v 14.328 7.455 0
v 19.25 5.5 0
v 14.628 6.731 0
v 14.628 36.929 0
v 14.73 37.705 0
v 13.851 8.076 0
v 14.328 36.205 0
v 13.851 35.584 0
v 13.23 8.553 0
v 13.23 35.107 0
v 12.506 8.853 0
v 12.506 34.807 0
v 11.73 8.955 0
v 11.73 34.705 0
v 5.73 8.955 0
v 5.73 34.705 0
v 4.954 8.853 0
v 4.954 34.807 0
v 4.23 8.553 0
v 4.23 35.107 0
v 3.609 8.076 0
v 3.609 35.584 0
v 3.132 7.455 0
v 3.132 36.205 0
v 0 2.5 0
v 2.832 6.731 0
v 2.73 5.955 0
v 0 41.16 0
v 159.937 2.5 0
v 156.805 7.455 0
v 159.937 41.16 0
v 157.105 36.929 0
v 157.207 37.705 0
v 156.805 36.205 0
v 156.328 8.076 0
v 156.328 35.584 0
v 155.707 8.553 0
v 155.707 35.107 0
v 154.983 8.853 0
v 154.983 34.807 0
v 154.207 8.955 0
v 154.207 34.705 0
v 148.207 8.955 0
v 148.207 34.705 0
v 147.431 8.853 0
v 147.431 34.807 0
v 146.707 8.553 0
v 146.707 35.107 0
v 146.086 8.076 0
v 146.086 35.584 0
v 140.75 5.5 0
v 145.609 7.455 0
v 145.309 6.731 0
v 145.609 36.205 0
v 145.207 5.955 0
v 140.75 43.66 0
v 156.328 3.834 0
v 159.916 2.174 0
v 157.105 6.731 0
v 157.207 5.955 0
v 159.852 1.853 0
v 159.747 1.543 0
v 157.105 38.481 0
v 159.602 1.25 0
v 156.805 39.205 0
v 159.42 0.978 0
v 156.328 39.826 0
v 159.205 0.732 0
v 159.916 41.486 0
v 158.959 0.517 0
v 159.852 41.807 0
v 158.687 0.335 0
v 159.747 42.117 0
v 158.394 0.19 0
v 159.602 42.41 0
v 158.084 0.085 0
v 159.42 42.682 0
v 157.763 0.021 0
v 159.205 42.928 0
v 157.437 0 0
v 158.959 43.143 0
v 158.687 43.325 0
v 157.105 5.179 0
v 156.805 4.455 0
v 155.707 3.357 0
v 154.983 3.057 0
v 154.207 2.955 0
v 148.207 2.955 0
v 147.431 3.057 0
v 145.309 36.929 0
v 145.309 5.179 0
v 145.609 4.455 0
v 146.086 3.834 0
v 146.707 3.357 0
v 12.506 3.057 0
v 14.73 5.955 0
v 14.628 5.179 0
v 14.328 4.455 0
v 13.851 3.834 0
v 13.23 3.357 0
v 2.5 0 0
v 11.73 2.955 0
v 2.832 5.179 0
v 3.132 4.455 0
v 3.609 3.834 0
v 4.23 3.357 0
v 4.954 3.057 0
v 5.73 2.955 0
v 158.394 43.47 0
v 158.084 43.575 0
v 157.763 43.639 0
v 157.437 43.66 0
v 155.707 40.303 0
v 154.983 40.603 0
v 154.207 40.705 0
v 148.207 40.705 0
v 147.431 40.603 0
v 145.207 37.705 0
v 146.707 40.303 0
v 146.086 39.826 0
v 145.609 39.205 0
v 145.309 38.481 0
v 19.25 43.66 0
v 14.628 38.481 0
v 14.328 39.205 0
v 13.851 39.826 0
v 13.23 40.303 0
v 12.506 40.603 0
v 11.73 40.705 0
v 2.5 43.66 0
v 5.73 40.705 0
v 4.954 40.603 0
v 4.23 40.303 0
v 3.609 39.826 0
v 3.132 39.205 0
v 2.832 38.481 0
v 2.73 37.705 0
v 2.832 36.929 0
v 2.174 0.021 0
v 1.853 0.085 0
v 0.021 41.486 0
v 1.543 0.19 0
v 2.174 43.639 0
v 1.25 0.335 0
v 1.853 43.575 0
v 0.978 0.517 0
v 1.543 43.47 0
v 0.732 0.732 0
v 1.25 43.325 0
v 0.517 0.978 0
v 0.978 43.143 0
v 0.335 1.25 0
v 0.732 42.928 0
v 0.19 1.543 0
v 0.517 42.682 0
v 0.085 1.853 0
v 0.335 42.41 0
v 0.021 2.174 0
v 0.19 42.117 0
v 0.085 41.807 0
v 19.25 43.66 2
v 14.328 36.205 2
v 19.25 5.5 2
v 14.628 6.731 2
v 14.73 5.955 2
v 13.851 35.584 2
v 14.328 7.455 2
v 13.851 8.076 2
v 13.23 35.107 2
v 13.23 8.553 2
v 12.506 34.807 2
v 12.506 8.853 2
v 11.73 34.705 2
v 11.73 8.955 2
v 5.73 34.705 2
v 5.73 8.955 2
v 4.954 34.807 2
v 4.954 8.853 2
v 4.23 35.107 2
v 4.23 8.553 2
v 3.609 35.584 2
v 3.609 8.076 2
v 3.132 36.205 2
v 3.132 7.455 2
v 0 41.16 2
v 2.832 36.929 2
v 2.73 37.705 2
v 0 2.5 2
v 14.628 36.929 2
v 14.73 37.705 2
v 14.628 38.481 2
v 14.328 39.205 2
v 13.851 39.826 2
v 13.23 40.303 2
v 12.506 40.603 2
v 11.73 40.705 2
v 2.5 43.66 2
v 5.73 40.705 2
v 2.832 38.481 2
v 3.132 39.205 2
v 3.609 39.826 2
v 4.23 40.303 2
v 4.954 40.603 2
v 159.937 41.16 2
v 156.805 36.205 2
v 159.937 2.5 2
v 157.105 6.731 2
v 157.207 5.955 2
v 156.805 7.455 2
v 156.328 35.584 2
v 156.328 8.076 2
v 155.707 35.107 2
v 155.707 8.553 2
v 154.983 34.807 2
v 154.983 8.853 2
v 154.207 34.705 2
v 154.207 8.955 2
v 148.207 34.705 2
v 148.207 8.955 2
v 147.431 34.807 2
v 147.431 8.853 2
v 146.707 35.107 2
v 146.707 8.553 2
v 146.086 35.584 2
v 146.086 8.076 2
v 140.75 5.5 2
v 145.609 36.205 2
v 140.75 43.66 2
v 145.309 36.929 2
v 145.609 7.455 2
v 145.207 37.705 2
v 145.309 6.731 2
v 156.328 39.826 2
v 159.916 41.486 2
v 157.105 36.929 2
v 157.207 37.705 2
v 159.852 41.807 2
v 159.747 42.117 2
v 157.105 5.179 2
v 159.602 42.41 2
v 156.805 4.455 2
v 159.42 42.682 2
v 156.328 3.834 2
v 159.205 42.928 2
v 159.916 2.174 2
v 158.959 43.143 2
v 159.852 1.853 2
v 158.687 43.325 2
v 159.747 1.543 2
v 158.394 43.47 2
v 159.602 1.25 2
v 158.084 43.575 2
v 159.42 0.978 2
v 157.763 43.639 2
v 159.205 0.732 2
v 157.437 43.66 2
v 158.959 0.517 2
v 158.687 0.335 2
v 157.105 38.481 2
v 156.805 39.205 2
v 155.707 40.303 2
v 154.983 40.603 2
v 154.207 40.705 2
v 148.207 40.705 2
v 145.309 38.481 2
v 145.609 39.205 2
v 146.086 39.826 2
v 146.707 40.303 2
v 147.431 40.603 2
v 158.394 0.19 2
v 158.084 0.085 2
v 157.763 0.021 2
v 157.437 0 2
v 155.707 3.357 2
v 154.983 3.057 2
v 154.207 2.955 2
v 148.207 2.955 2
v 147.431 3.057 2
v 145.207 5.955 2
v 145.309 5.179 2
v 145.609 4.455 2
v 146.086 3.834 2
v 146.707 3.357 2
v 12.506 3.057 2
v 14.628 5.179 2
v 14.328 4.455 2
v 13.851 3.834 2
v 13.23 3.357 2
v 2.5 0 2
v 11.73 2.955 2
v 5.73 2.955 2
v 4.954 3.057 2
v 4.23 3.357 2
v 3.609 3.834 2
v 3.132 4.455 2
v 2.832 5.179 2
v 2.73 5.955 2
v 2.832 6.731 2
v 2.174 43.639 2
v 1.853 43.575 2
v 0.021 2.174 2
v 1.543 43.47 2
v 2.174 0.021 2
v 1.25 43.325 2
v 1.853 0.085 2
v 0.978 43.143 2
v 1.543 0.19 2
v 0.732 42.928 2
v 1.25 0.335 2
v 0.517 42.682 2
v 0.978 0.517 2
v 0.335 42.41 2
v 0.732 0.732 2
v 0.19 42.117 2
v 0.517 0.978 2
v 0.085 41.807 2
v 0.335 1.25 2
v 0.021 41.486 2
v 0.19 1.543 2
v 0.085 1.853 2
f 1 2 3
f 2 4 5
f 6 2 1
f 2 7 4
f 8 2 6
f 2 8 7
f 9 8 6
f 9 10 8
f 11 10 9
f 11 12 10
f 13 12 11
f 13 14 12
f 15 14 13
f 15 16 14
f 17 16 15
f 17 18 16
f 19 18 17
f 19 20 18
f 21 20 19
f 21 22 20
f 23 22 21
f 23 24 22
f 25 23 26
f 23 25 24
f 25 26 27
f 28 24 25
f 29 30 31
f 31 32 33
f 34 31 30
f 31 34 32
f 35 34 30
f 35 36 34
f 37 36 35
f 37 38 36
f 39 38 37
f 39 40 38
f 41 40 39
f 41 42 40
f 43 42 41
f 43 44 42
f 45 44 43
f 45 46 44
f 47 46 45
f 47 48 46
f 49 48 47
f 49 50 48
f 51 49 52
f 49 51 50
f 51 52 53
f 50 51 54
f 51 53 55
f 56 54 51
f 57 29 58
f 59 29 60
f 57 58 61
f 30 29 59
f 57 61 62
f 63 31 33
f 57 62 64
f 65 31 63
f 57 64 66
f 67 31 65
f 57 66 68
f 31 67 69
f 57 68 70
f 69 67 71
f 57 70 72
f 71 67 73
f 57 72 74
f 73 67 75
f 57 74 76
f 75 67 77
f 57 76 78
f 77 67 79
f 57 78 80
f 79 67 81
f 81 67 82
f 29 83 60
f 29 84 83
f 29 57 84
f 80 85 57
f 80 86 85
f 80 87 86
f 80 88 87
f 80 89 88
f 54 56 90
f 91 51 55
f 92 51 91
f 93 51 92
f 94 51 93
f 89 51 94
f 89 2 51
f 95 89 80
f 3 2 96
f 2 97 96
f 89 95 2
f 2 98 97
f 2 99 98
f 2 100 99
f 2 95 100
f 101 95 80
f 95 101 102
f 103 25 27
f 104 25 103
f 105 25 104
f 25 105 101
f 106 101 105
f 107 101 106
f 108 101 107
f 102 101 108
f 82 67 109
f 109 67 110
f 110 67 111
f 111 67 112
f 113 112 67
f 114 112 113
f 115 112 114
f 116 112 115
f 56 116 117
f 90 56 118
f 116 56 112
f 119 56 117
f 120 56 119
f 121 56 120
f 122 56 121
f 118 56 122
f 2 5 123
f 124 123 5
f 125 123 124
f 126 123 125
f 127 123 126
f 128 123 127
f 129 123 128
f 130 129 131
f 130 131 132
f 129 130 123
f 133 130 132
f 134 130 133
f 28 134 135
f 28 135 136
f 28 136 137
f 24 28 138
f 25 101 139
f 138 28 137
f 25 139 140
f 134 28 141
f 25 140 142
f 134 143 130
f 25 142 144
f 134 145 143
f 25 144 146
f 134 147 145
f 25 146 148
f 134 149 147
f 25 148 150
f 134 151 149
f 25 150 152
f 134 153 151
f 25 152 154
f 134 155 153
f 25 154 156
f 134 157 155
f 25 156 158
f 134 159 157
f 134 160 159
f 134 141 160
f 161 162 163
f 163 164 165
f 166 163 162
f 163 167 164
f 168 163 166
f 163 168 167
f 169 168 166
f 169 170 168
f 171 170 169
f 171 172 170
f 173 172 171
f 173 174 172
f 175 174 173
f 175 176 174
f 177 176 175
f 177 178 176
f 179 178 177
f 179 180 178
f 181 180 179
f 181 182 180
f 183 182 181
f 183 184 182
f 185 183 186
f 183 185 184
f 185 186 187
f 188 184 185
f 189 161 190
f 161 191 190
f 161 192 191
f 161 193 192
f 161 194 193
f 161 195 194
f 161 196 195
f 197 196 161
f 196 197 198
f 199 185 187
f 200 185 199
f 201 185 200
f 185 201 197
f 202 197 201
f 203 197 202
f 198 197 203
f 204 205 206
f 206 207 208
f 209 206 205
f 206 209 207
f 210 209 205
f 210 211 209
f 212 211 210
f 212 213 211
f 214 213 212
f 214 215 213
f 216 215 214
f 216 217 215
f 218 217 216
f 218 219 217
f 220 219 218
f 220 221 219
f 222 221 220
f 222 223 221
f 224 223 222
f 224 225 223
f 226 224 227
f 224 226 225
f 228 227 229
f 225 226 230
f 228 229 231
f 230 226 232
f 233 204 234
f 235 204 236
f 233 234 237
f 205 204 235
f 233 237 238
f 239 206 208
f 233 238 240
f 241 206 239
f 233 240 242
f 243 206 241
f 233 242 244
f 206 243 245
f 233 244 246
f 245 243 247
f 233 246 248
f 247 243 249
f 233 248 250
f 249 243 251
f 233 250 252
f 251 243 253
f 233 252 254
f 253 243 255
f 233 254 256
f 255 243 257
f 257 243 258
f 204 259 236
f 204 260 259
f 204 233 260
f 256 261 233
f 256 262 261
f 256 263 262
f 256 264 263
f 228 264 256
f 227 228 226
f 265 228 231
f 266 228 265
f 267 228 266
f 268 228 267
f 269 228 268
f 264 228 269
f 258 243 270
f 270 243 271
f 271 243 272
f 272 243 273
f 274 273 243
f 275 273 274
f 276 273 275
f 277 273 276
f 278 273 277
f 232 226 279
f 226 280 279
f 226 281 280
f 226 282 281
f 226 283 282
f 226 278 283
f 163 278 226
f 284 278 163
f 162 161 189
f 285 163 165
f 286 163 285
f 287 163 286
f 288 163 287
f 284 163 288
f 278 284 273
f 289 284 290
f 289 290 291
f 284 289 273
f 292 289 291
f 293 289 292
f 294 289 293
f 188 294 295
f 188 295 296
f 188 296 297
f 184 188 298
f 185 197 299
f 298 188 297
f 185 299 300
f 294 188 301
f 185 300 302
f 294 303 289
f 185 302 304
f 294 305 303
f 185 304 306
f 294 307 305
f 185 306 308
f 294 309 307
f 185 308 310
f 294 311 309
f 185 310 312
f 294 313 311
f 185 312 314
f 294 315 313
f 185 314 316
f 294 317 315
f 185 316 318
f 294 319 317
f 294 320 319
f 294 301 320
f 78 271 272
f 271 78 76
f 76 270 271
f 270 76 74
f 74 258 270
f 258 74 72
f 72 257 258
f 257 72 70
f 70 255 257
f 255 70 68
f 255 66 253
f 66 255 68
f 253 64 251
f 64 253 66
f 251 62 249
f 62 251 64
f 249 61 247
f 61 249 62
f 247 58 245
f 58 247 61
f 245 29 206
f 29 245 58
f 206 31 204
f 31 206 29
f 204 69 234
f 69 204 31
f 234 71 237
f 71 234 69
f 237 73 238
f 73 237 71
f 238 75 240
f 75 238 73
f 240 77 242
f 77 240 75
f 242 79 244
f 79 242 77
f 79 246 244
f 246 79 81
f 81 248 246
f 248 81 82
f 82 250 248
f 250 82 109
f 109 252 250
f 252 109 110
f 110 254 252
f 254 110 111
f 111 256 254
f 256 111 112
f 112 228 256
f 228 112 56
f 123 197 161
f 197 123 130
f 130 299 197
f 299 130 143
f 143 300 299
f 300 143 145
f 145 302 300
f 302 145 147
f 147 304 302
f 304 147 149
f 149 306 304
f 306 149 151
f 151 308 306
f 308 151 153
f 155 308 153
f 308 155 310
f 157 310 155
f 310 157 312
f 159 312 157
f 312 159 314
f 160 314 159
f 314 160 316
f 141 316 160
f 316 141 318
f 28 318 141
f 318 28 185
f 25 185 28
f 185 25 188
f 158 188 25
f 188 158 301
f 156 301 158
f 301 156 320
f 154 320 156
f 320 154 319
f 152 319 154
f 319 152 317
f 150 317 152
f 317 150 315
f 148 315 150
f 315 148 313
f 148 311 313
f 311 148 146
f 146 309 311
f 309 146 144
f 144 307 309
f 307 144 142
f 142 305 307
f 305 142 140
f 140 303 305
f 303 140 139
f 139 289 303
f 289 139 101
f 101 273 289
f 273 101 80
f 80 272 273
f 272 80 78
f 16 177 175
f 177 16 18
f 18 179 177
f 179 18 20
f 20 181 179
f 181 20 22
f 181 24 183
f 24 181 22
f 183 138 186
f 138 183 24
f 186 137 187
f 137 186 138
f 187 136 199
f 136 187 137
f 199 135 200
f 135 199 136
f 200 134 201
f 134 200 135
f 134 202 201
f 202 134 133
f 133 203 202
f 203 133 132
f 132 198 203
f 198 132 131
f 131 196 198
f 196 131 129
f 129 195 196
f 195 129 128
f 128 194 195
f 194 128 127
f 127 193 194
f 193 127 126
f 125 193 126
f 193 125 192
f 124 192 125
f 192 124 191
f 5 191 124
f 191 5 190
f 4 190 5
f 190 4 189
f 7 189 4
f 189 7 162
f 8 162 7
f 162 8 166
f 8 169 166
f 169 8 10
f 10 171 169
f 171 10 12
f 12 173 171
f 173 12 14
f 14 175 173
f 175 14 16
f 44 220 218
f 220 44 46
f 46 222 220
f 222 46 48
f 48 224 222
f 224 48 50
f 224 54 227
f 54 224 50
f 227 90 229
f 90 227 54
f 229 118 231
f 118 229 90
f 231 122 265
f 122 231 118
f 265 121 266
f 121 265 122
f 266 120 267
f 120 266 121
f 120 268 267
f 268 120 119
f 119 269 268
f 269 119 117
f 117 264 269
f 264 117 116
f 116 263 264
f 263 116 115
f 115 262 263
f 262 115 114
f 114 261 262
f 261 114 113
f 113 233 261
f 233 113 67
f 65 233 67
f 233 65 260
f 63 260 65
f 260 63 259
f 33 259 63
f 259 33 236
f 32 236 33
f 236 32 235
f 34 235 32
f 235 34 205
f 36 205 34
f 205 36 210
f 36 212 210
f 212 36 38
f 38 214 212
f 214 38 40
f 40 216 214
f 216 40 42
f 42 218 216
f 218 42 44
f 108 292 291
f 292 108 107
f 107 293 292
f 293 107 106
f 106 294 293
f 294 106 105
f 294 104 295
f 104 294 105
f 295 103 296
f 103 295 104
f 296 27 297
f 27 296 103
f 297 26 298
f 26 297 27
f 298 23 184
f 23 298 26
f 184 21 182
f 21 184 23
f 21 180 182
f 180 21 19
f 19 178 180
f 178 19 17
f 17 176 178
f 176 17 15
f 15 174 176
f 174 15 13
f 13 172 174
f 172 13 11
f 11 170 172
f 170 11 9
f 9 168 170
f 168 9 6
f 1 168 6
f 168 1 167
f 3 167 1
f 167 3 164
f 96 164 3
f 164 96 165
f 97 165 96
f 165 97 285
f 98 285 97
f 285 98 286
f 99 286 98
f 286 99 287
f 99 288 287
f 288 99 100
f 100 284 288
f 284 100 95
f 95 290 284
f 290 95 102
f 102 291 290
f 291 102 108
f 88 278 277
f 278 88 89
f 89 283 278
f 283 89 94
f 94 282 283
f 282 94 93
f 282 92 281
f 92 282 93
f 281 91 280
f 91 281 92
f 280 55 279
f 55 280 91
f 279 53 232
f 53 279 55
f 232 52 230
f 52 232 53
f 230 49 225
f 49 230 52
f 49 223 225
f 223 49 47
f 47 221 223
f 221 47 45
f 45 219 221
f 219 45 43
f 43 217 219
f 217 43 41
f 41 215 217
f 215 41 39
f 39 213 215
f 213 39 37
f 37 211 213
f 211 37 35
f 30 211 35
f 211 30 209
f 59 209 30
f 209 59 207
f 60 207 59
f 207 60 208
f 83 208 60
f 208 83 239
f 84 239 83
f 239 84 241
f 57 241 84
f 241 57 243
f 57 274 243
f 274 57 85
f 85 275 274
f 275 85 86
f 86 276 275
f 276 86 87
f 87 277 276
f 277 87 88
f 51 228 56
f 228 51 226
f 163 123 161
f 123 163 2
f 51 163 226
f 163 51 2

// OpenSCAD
// file: rack_plate.scad
/**
 * OpenSCAD Rack Plate Library
 * 
 * Conforms to standards defined in Wikipedia for Rack Units (19-inch racks).
 * Formula for height: h = 44.45 * n - 0.79 (mm)
 * Standard mounting width: 465.14 mm (center-to-center)
 */

// --- Default Values ---
DEFAULT_U_COUNT = 1;
DEFAULT_THICKNESS = 3;
DEFAULT_WIDTH_INCHES = 6.5;
DEFAULT_CORNER_RADIUS = 2.5;
DEFAULT_HOLE_DIAMETER = 6;
DEFAULT_SLOT_LENGTH = 12; // At least twice the diameter (6mm * 2)

// --- Modules ---

/**
 * Generates a rack plate.
 * 
 * @param u_count Number of rack units (n)
 * @param thickness Plate thickness in mm
 * @param width_inches Nominal width of the rack in inches (default 19)
 * @param corner_radius Radius for the outer corners in mm
 * @param hole_diameter Diameter of the mounting holes in mm
 * @param slot_length Total length of the oblong mounting holes in mm
 */
module rack_plate(
    u_count         = DEFAULT_U_COUNT,
    thickness       = DEFAULT_THICKNESS,
    width_inches    = DEFAULT_WIDTH_INCHES,
    corner_radius   = DEFAULT_CORNER_RADIUS,
    hole_diameter   = DEFAULT_HOLE_DIAMETER,
    slot_length     = DEFAULT_SLOT_LENGTH
) {
    // Requirements validation
    assert(width_inches >= 5.5 && width_inches <= 23, "Width must be between 5.5 and 23 inches");

    // Constants based on requirements
    u_height_mm = 44.45;
    height_offset_mm = 0.79;
    
    // Formula: h = 44.45 * n - 0.79
    total_height = (u_height_mm * u_count) - height_offset_mm;
    
    // 19-inch rack mounting width (center to center)
    // Wikipedia: 18.313 in = 465.14 mm
    standard_mounting_width = 465.14; 
    standard_total_width = 19 * 25.4; // 482.6 mm
    
    // Total width of the plate. 
    total_width = width_inches * 25.4;
    
    // Flange width calculation (distance from edge to mounting hole center)
    // "It is critical that the mounting holes retain their position relative to the adjacent ends of the panel"
    // For a standard 19" rack, the offset from edge to hole center is:
    edge_to_hole_offset = (standard_total_width - standard_mounting_width) / 2;

    linear_extrude(height = thickness) 
    {
        difference() 
        {
            // Main Plate Body with rounded corners
            rounded_rect(total_width, total_height, corner_radius);

            // Mounting Holes
            // "The code should generate flanges with 2 rather than three holes per 1 U of height."
            if (u_count >= 1.0) 
            {
                for (u = [0 : floor(u_count) - 1]) 
                {
                    u_base_y = u * u_height_mm;
                    hole_spacing = 31.75; 
                    y_offset = (u_height_mm - hole_spacing) / 2;
                    
                    y_pos1 = u_base_y + y_offset;
                    y_pos2 = u_base_y + y_offset + hole_spacing;
    
                    // Center holes in the total_height
                    // Since total_height = u_count * 44.45 - 0.79, 
                    // the gaps are at the top and bottom of the stack.
                    // We shift everything by (0.79 / 2) to center it if we consider 
                    // the 0.79 to be distributed.
                    // Actually, the previous code had a formula for center_shift.
                    total_nominal_height = u_height_mm * u_count;
                    center_shift = (total_nominal_height - total_height) / 2;
                    
                    p1 = y_pos1 - center_shift;
                    p2 = y_pos2 - center_shift;
    
                    // Left Holes (Oblong)
                    translate([edge_to_hole_offset, p1])
                    {
                        oblong_hole(hole_diameter, slot_length);
                    }
                    translate([edge_to_hole_offset, p2]) 
                    {
                        oblong_hole(hole_diameter, slot_length);
                    }   
                    // Right Holes (Oblong)
                    translate([total_width - edge_to_hole_offset, p1]) 
                    {
                        oblong_hole(hole_diameter, slot_length);
                    }
                    translate([total_width - edge_to_hole_offset, p2]) 
                    {
                        oblong_hole(hole_diameter, slot_length);
                    }
                }
            }
            else if(u_count < 1.0)
            {
                // There can only be one mounting hole on each side, if any.
                u = 0;
                u_base_y = u * u_height_mm/2;
                hole_spacing = 31.75; 
                y_offset = (u_height_mm - hole_spacing) / 2;
                
                y_pos1 = u_base_y + u_height_mm/4;

                // Center holes in the total_height
                // Since total_height = u_count * 44.45 - 0.79, 
                // the gaps are at the top and bottom of the stack.
                // We shift everything by (0.79 / 2) to center it if we consider 
                // the 0.79 to be distributed.
                // Actually, the previous code had a formula for center_shift.
                total_nominal_height = u_height_mm * u_count;
                center_shift = (total_nominal_height - total_height) / 2;
                
                p1 = y_pos1 - center_shift;

                // Left Holes (Oblong vertical)
                translate([edge_to_hole_offset,  p1])
                {
                    rotate([0, 0, 90])
                    {
                        oblong_hole(hole_diameter, slot_length);
                    }
                }
                    
                // Right Holes (Oblong vertical)
                translate([total_width - edge_to_hole_offset, p1])
                {
                    rotate([0, 0, 90])
                    {
                        oblong_hole(hole_diameter, slot_length);
                    }
                }
            }
        }
    }
}

/**
 * Helper for oblong (slotted) hole
 */
module oblong_hole(d, l) 
{
    hull() 
    {
        translate([-(l - d) / 2, 0]) circle(d = d, $fn = 24);
        translate([(l - d) / 2, 0]) circle(d = d, $fn = 24);
    }
}

/**
 * Helper for rounded rectangle 2D shape
 */
module rounded_rect(w, h, r) 
{
    translate([r, r, 0])
    {
        minkowski() 
        {
            square([w - 2 * r, h - 2 * r]);
            circle(r = r, $fn = 48);
        }
    } 
}

// --- Example Usage ---
// This will render when the file is opened directly in OpenSCAD
// but won't interfere when included in other files.

rack_plate(u_count = 0.75, width_inches= 6.5);
// main file
// Simple rack panel for Pi Display 2 (small)
//
// (c) 2026 David M. Witten II
//===================================================================
// Constant Parameters
use <rack_plate.scad>
in2mm               = 25.41;  // mm / in

plate_length        = 16.0;   // mm
plate_width         = 160.0;  // mm
plate_thickness     = 2.0;    // mm

mnt_hole_width      = 7.5;    // mm
mnt_hole_len        = 11.0;   // mm

//===================================================================
// Modifiable Parameters


//===================================================================
// Main()
module cutout()
{
    display_cutout = cube([120, 75, 16]);
}

//===================================================================
// main()
module main()
{
    difference()
    {
        rack_plate(u_count = 1, thickness = plate_thickness, width_inches = (plate_length/(in2mm/10)));
        translate([(140 - 120.75), 5.5, -8])
        {
            cube([121.5, 75.75, 16]);
        }
    }
}

main();
